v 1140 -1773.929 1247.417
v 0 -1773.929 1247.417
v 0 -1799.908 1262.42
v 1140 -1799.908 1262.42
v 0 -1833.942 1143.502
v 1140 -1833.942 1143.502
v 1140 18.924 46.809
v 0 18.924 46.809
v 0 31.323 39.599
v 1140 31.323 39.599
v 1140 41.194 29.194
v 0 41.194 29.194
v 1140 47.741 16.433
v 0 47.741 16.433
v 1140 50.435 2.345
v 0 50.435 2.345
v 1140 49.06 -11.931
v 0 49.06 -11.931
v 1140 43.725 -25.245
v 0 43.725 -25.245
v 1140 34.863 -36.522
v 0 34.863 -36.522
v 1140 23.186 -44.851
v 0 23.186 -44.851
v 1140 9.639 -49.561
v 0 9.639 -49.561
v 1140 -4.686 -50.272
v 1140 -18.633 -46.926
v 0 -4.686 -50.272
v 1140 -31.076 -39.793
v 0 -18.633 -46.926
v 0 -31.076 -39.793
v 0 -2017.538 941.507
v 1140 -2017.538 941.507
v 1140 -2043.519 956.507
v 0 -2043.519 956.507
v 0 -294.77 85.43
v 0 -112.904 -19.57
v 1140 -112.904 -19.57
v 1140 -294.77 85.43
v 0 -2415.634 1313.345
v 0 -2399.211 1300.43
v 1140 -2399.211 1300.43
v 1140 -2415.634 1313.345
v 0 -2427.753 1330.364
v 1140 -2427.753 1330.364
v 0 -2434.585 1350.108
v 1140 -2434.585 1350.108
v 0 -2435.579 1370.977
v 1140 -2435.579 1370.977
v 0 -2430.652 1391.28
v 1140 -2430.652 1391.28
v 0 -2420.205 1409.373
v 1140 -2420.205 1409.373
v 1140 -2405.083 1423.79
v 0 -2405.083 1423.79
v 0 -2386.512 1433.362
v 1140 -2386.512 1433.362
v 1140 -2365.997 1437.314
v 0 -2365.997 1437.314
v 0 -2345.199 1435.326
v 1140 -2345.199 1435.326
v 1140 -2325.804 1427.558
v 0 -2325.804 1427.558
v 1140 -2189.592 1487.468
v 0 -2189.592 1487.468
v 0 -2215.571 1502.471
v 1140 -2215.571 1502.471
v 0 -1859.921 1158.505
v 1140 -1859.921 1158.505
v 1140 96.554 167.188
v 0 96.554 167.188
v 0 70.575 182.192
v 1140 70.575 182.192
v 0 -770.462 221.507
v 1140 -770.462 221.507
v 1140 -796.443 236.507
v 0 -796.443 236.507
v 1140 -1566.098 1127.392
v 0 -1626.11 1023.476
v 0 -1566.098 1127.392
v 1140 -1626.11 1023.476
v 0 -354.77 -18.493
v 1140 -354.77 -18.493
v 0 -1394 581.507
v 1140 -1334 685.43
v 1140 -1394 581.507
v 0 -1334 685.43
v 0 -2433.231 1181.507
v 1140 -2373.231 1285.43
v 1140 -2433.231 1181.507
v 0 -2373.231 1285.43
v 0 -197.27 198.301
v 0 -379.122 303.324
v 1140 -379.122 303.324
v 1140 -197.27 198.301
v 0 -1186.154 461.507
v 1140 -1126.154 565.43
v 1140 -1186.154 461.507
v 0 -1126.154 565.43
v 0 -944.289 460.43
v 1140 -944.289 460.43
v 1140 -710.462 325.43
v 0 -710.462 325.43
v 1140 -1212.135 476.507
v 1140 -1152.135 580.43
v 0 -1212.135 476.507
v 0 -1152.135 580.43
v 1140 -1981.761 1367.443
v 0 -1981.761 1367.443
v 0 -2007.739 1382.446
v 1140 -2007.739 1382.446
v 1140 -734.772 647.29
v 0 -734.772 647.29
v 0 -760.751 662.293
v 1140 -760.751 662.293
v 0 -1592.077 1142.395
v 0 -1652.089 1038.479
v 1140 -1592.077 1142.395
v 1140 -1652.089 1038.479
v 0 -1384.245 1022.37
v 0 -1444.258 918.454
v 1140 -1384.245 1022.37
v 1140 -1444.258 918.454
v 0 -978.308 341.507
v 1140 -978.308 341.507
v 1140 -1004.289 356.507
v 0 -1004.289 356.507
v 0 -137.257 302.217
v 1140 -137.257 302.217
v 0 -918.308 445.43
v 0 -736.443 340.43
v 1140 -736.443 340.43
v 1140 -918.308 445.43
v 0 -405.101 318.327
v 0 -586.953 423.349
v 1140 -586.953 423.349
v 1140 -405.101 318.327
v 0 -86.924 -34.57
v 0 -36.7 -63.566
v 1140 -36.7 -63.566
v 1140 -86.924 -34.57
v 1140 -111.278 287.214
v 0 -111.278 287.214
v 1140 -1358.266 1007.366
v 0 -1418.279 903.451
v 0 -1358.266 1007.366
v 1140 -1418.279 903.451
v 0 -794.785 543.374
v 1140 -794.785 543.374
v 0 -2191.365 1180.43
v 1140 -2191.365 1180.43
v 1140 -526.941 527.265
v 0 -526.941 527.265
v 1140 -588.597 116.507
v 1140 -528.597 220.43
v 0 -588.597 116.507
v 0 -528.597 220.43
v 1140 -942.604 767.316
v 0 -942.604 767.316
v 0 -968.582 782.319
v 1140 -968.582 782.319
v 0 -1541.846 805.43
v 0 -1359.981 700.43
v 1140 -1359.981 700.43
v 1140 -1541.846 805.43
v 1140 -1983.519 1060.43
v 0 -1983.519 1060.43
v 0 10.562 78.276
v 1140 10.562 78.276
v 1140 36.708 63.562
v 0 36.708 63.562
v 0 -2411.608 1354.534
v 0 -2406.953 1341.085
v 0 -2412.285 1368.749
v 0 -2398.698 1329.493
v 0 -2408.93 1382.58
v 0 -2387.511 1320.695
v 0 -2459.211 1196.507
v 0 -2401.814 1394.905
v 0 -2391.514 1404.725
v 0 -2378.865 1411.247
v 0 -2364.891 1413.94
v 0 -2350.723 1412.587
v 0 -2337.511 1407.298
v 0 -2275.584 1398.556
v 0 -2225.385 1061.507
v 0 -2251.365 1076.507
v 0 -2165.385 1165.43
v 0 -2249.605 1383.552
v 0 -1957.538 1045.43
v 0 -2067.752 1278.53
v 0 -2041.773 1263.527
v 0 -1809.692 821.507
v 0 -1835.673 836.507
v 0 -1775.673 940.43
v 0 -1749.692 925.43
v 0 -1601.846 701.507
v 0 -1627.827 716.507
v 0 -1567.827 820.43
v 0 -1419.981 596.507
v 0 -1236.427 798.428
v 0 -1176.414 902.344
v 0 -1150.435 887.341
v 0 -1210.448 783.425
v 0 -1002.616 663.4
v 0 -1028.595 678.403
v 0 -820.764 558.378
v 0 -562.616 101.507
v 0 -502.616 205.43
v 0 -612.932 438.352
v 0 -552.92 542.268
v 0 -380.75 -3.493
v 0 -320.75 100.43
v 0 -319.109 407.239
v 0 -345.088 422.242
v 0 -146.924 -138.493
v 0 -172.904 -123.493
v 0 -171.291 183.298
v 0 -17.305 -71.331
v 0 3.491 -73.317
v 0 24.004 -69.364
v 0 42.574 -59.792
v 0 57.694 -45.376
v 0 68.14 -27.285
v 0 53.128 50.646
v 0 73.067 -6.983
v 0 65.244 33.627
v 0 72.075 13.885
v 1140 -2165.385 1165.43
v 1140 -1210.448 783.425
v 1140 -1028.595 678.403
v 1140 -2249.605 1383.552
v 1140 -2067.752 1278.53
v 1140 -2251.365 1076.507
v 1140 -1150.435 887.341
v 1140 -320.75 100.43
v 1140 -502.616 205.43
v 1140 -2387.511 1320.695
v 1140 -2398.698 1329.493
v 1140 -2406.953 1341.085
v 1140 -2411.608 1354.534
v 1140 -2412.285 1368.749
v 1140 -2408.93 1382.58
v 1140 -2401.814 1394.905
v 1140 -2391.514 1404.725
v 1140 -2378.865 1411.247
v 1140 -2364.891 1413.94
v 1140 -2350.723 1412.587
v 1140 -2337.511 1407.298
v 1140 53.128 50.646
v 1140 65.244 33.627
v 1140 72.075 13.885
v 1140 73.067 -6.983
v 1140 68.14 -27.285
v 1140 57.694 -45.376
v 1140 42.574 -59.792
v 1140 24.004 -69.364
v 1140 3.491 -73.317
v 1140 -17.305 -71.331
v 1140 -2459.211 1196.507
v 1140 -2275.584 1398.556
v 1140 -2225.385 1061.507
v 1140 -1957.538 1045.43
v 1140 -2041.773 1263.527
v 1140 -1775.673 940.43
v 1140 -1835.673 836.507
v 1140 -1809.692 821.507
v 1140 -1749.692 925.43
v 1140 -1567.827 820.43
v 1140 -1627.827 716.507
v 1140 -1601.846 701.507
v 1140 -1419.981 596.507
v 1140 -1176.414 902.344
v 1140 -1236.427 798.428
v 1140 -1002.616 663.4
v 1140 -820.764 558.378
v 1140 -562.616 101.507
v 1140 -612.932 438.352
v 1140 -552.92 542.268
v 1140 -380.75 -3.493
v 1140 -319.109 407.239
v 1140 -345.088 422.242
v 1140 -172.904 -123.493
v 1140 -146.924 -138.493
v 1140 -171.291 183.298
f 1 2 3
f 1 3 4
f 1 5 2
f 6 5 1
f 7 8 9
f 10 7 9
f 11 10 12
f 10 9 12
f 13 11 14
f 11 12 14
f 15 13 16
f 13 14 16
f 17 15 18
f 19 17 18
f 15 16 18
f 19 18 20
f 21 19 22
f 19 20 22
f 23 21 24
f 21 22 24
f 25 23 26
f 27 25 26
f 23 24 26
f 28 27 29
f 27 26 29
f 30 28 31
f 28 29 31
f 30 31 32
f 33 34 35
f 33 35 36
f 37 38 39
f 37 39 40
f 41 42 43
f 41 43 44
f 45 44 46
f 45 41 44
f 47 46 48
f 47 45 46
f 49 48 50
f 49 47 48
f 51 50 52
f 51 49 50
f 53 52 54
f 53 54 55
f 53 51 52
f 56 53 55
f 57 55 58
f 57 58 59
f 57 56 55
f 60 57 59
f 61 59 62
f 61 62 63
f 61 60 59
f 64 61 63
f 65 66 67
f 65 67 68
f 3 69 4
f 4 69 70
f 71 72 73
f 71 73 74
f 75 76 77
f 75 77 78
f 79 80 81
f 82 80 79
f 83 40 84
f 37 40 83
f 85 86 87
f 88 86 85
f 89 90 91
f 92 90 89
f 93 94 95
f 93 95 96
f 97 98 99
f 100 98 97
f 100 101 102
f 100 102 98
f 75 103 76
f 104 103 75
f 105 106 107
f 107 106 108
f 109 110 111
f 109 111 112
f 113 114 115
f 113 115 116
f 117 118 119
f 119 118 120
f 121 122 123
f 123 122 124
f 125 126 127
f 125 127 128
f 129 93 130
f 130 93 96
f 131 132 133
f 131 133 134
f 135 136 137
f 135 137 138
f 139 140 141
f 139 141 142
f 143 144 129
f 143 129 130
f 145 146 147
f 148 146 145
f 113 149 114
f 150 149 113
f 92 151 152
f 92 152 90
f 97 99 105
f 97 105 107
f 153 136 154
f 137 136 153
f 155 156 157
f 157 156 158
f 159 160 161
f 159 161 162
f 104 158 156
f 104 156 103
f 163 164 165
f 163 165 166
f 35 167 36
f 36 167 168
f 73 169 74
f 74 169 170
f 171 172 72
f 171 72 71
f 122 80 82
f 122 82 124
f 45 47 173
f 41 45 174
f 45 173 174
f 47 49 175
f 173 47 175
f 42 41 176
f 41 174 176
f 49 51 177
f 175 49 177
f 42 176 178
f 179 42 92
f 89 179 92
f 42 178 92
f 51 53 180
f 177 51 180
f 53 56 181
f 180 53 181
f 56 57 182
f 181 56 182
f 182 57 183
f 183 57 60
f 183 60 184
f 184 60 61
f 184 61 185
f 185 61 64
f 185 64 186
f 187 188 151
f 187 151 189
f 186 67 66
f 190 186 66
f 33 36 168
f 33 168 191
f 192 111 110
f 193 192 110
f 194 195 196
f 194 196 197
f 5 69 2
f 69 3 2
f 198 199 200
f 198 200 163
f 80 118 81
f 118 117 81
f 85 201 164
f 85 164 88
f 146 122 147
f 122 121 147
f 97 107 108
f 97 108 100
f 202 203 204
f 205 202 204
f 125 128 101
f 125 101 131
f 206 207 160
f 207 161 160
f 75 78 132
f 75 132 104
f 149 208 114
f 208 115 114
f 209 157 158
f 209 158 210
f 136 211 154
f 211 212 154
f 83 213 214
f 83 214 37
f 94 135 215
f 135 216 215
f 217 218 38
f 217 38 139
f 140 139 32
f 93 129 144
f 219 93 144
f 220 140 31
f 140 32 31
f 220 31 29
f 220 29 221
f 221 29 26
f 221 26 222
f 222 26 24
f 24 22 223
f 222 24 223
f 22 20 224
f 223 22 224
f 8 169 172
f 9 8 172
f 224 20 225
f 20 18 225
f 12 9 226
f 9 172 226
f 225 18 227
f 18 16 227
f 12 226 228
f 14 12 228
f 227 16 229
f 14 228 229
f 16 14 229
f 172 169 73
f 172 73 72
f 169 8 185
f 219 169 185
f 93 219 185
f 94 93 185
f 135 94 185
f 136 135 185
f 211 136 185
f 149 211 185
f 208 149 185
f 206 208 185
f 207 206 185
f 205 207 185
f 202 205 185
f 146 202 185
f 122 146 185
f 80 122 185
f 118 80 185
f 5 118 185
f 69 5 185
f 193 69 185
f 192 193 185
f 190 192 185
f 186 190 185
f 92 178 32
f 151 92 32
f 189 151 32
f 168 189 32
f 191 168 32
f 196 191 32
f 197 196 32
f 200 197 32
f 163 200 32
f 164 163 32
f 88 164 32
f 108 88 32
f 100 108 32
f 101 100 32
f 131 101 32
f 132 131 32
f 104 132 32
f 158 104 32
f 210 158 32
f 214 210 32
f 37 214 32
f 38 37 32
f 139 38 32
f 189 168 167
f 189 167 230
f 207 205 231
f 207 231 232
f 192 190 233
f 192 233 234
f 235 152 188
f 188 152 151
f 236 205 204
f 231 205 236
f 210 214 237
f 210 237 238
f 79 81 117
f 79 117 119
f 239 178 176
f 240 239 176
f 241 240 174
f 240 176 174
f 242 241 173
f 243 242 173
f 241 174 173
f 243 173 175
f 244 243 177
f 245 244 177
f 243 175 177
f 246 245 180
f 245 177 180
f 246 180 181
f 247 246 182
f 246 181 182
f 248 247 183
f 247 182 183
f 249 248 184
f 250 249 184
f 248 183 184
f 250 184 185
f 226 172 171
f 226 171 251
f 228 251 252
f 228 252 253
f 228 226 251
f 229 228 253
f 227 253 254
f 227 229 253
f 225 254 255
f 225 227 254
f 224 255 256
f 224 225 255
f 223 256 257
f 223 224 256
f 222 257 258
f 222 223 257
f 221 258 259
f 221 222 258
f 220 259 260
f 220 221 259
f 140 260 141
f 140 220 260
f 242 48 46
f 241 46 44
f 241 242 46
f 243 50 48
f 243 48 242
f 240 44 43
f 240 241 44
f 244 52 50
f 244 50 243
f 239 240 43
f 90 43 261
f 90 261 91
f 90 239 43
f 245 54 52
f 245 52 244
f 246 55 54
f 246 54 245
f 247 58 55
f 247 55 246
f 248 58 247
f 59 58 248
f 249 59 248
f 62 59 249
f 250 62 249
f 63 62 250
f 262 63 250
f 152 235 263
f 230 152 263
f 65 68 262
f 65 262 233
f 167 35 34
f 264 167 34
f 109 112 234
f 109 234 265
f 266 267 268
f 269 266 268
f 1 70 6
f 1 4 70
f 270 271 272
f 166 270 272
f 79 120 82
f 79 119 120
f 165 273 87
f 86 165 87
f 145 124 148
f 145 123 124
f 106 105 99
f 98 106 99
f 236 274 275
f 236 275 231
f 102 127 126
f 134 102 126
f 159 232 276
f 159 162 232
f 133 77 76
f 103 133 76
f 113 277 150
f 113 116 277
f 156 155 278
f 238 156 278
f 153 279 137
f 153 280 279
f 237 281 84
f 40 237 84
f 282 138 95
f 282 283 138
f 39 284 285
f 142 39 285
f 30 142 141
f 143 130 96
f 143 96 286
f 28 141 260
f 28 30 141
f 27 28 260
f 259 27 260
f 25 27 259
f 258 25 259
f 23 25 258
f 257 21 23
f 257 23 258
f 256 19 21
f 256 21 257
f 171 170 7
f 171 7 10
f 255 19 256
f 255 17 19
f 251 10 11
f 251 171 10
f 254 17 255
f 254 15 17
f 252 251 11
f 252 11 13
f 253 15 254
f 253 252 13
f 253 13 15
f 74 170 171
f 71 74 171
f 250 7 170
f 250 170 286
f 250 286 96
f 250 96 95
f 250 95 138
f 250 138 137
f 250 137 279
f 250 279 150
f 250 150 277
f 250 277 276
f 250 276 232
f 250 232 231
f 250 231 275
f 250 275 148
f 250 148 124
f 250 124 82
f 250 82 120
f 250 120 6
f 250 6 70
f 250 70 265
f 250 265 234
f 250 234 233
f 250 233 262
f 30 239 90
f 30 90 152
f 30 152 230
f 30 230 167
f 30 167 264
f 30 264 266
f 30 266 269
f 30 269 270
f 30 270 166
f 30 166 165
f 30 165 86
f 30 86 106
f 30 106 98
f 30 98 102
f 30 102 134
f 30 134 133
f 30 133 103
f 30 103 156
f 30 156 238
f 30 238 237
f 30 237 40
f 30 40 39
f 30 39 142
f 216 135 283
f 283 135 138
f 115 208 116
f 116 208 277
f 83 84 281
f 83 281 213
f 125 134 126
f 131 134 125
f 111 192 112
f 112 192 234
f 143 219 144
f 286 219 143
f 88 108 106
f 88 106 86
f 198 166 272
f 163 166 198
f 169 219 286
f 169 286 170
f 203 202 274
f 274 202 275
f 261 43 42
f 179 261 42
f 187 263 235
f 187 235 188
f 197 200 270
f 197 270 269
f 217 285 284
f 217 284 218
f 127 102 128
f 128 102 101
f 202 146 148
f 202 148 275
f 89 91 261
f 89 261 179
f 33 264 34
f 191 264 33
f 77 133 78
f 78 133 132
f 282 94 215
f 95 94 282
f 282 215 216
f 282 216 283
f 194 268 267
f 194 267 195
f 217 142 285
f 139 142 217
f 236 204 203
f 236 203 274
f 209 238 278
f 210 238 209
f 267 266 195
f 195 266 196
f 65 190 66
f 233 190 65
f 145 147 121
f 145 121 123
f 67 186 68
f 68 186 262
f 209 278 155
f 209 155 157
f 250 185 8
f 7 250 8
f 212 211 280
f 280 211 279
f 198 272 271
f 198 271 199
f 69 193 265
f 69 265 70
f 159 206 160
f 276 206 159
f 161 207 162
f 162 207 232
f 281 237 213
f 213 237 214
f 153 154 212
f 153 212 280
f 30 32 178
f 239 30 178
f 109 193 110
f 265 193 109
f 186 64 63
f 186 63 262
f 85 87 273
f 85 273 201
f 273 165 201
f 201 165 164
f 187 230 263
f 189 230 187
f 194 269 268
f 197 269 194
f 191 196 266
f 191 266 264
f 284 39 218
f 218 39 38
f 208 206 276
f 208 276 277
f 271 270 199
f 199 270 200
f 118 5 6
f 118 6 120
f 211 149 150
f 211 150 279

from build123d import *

# Parameters (mm, degrees)
BOSS_EXTRUDE1_DEPTH = 1140
SKETCH2_W           = 1140
SKETCH2_H           = 30
BOSS_EXTRUDE2_DEPTH = 120
LPATTERN1_COUNT     = 12
LPATTERN1_PITCH     = 240
SKETCH3_W           = 1140
SKETCH3_H           = 30
BOSS_EXTRUDE3_DEPTH = 120
LPATTERN2_COUNT     = 12
LPATTERN2_PITCH     = 240


with BuildPart() as part:
    # Sketch1 → Boss-Extrude1 (new body)
    with BuildSketch(Plane(origin=(0, 0, 0), x_dir=(0, 0, -1), z_dir=(1, 0, 0))):
        with BuildLine():
            Line((-1427.55837346, -2325.803634702), (-66.769925465, 30.485029988))
            ThreePointArc((-66.769925465, 30.485029988), (33.630684267, 65.242141869), (63.566264638, -36.7))
            Line((63.566264638, -36.7), (-1300.430336503, -2399.211414527))
            ThreePointArc((-1300.430336503, -2399.211414527), (-1400.700491121, -2426.075433124), (-1427.55837346, -2325.803634702))
        make_face()
        with BuildLine():
            Line((-1407.29787133, -2337.511414527), (-46.809262955, 18.923978297))
            ThreePointArc((-46.809262955, 18.923978297), (25.244920543, 43.725485014), (39.793277424, -31.076021703))
            Line((39.793277424, -31.076021703), (-1320.695330951, -2387.511414527))
            ThreePointArc((-1320.695330951, -2387.511414527), (-1388.996601141, -2405.812684716), (-1407.29787133, -2337.511414527))
        make_face(mode=Mode.SUBTRACT)
    extrude(amount=BOSS_EXTRUDE1_DEPTH)

    # Sketch2 → Boss-Extrude2 (add)
    with BuildSketch(Plane(origin=(0, 36.540800081, 63.272636652), x_dir=(1, 0, 0), z_dir=(0, 0.5001059921576408, 0.8659642005348847))):
        with Locations((570, -15)):
            Rectangle(SKETCH2_W, SKETCH2_H)
    boss_extrude2 = extrude(amount=BOSS_EXTRUDE2_DEPTH)

    # LPattern1: Boss-Extrude2 ×12
    with Locations(*[Vector(0, -0.8659642005348845, 0.5001059921576408) * (i * LPATTERN1_PITCH) for i in range(1, LPATTERN1_COUNT)]):
        add(boss_extrude2)

    # Sketch3 → Boss-Extrude3 (add)
    with BuildSketch(Plane(origin=(0, -36.7, -63.566264638), x_dir=(-1, 0, 0), z_dir=(0, -0.49999999999999756, -0.86602540378444))):
        with Locations((-570, -2712.993202281)):
            Rectangle(SKETCH3_W, SKETCH3_H)
    boss_extrude3 = extrude(amount=BOSS_EXTRUDE3_DEPTH)

    # LPattern2: Boss-Extrude3 ×12
    with Locations(*[Vector(0, 0.86602540378444, -0.49999999999999767) * (i * LPATTERN2_PITCH) for i in range(1, LPATTERN2_COUNT)]):
        add(boss_extrude3)


solid = part.part
